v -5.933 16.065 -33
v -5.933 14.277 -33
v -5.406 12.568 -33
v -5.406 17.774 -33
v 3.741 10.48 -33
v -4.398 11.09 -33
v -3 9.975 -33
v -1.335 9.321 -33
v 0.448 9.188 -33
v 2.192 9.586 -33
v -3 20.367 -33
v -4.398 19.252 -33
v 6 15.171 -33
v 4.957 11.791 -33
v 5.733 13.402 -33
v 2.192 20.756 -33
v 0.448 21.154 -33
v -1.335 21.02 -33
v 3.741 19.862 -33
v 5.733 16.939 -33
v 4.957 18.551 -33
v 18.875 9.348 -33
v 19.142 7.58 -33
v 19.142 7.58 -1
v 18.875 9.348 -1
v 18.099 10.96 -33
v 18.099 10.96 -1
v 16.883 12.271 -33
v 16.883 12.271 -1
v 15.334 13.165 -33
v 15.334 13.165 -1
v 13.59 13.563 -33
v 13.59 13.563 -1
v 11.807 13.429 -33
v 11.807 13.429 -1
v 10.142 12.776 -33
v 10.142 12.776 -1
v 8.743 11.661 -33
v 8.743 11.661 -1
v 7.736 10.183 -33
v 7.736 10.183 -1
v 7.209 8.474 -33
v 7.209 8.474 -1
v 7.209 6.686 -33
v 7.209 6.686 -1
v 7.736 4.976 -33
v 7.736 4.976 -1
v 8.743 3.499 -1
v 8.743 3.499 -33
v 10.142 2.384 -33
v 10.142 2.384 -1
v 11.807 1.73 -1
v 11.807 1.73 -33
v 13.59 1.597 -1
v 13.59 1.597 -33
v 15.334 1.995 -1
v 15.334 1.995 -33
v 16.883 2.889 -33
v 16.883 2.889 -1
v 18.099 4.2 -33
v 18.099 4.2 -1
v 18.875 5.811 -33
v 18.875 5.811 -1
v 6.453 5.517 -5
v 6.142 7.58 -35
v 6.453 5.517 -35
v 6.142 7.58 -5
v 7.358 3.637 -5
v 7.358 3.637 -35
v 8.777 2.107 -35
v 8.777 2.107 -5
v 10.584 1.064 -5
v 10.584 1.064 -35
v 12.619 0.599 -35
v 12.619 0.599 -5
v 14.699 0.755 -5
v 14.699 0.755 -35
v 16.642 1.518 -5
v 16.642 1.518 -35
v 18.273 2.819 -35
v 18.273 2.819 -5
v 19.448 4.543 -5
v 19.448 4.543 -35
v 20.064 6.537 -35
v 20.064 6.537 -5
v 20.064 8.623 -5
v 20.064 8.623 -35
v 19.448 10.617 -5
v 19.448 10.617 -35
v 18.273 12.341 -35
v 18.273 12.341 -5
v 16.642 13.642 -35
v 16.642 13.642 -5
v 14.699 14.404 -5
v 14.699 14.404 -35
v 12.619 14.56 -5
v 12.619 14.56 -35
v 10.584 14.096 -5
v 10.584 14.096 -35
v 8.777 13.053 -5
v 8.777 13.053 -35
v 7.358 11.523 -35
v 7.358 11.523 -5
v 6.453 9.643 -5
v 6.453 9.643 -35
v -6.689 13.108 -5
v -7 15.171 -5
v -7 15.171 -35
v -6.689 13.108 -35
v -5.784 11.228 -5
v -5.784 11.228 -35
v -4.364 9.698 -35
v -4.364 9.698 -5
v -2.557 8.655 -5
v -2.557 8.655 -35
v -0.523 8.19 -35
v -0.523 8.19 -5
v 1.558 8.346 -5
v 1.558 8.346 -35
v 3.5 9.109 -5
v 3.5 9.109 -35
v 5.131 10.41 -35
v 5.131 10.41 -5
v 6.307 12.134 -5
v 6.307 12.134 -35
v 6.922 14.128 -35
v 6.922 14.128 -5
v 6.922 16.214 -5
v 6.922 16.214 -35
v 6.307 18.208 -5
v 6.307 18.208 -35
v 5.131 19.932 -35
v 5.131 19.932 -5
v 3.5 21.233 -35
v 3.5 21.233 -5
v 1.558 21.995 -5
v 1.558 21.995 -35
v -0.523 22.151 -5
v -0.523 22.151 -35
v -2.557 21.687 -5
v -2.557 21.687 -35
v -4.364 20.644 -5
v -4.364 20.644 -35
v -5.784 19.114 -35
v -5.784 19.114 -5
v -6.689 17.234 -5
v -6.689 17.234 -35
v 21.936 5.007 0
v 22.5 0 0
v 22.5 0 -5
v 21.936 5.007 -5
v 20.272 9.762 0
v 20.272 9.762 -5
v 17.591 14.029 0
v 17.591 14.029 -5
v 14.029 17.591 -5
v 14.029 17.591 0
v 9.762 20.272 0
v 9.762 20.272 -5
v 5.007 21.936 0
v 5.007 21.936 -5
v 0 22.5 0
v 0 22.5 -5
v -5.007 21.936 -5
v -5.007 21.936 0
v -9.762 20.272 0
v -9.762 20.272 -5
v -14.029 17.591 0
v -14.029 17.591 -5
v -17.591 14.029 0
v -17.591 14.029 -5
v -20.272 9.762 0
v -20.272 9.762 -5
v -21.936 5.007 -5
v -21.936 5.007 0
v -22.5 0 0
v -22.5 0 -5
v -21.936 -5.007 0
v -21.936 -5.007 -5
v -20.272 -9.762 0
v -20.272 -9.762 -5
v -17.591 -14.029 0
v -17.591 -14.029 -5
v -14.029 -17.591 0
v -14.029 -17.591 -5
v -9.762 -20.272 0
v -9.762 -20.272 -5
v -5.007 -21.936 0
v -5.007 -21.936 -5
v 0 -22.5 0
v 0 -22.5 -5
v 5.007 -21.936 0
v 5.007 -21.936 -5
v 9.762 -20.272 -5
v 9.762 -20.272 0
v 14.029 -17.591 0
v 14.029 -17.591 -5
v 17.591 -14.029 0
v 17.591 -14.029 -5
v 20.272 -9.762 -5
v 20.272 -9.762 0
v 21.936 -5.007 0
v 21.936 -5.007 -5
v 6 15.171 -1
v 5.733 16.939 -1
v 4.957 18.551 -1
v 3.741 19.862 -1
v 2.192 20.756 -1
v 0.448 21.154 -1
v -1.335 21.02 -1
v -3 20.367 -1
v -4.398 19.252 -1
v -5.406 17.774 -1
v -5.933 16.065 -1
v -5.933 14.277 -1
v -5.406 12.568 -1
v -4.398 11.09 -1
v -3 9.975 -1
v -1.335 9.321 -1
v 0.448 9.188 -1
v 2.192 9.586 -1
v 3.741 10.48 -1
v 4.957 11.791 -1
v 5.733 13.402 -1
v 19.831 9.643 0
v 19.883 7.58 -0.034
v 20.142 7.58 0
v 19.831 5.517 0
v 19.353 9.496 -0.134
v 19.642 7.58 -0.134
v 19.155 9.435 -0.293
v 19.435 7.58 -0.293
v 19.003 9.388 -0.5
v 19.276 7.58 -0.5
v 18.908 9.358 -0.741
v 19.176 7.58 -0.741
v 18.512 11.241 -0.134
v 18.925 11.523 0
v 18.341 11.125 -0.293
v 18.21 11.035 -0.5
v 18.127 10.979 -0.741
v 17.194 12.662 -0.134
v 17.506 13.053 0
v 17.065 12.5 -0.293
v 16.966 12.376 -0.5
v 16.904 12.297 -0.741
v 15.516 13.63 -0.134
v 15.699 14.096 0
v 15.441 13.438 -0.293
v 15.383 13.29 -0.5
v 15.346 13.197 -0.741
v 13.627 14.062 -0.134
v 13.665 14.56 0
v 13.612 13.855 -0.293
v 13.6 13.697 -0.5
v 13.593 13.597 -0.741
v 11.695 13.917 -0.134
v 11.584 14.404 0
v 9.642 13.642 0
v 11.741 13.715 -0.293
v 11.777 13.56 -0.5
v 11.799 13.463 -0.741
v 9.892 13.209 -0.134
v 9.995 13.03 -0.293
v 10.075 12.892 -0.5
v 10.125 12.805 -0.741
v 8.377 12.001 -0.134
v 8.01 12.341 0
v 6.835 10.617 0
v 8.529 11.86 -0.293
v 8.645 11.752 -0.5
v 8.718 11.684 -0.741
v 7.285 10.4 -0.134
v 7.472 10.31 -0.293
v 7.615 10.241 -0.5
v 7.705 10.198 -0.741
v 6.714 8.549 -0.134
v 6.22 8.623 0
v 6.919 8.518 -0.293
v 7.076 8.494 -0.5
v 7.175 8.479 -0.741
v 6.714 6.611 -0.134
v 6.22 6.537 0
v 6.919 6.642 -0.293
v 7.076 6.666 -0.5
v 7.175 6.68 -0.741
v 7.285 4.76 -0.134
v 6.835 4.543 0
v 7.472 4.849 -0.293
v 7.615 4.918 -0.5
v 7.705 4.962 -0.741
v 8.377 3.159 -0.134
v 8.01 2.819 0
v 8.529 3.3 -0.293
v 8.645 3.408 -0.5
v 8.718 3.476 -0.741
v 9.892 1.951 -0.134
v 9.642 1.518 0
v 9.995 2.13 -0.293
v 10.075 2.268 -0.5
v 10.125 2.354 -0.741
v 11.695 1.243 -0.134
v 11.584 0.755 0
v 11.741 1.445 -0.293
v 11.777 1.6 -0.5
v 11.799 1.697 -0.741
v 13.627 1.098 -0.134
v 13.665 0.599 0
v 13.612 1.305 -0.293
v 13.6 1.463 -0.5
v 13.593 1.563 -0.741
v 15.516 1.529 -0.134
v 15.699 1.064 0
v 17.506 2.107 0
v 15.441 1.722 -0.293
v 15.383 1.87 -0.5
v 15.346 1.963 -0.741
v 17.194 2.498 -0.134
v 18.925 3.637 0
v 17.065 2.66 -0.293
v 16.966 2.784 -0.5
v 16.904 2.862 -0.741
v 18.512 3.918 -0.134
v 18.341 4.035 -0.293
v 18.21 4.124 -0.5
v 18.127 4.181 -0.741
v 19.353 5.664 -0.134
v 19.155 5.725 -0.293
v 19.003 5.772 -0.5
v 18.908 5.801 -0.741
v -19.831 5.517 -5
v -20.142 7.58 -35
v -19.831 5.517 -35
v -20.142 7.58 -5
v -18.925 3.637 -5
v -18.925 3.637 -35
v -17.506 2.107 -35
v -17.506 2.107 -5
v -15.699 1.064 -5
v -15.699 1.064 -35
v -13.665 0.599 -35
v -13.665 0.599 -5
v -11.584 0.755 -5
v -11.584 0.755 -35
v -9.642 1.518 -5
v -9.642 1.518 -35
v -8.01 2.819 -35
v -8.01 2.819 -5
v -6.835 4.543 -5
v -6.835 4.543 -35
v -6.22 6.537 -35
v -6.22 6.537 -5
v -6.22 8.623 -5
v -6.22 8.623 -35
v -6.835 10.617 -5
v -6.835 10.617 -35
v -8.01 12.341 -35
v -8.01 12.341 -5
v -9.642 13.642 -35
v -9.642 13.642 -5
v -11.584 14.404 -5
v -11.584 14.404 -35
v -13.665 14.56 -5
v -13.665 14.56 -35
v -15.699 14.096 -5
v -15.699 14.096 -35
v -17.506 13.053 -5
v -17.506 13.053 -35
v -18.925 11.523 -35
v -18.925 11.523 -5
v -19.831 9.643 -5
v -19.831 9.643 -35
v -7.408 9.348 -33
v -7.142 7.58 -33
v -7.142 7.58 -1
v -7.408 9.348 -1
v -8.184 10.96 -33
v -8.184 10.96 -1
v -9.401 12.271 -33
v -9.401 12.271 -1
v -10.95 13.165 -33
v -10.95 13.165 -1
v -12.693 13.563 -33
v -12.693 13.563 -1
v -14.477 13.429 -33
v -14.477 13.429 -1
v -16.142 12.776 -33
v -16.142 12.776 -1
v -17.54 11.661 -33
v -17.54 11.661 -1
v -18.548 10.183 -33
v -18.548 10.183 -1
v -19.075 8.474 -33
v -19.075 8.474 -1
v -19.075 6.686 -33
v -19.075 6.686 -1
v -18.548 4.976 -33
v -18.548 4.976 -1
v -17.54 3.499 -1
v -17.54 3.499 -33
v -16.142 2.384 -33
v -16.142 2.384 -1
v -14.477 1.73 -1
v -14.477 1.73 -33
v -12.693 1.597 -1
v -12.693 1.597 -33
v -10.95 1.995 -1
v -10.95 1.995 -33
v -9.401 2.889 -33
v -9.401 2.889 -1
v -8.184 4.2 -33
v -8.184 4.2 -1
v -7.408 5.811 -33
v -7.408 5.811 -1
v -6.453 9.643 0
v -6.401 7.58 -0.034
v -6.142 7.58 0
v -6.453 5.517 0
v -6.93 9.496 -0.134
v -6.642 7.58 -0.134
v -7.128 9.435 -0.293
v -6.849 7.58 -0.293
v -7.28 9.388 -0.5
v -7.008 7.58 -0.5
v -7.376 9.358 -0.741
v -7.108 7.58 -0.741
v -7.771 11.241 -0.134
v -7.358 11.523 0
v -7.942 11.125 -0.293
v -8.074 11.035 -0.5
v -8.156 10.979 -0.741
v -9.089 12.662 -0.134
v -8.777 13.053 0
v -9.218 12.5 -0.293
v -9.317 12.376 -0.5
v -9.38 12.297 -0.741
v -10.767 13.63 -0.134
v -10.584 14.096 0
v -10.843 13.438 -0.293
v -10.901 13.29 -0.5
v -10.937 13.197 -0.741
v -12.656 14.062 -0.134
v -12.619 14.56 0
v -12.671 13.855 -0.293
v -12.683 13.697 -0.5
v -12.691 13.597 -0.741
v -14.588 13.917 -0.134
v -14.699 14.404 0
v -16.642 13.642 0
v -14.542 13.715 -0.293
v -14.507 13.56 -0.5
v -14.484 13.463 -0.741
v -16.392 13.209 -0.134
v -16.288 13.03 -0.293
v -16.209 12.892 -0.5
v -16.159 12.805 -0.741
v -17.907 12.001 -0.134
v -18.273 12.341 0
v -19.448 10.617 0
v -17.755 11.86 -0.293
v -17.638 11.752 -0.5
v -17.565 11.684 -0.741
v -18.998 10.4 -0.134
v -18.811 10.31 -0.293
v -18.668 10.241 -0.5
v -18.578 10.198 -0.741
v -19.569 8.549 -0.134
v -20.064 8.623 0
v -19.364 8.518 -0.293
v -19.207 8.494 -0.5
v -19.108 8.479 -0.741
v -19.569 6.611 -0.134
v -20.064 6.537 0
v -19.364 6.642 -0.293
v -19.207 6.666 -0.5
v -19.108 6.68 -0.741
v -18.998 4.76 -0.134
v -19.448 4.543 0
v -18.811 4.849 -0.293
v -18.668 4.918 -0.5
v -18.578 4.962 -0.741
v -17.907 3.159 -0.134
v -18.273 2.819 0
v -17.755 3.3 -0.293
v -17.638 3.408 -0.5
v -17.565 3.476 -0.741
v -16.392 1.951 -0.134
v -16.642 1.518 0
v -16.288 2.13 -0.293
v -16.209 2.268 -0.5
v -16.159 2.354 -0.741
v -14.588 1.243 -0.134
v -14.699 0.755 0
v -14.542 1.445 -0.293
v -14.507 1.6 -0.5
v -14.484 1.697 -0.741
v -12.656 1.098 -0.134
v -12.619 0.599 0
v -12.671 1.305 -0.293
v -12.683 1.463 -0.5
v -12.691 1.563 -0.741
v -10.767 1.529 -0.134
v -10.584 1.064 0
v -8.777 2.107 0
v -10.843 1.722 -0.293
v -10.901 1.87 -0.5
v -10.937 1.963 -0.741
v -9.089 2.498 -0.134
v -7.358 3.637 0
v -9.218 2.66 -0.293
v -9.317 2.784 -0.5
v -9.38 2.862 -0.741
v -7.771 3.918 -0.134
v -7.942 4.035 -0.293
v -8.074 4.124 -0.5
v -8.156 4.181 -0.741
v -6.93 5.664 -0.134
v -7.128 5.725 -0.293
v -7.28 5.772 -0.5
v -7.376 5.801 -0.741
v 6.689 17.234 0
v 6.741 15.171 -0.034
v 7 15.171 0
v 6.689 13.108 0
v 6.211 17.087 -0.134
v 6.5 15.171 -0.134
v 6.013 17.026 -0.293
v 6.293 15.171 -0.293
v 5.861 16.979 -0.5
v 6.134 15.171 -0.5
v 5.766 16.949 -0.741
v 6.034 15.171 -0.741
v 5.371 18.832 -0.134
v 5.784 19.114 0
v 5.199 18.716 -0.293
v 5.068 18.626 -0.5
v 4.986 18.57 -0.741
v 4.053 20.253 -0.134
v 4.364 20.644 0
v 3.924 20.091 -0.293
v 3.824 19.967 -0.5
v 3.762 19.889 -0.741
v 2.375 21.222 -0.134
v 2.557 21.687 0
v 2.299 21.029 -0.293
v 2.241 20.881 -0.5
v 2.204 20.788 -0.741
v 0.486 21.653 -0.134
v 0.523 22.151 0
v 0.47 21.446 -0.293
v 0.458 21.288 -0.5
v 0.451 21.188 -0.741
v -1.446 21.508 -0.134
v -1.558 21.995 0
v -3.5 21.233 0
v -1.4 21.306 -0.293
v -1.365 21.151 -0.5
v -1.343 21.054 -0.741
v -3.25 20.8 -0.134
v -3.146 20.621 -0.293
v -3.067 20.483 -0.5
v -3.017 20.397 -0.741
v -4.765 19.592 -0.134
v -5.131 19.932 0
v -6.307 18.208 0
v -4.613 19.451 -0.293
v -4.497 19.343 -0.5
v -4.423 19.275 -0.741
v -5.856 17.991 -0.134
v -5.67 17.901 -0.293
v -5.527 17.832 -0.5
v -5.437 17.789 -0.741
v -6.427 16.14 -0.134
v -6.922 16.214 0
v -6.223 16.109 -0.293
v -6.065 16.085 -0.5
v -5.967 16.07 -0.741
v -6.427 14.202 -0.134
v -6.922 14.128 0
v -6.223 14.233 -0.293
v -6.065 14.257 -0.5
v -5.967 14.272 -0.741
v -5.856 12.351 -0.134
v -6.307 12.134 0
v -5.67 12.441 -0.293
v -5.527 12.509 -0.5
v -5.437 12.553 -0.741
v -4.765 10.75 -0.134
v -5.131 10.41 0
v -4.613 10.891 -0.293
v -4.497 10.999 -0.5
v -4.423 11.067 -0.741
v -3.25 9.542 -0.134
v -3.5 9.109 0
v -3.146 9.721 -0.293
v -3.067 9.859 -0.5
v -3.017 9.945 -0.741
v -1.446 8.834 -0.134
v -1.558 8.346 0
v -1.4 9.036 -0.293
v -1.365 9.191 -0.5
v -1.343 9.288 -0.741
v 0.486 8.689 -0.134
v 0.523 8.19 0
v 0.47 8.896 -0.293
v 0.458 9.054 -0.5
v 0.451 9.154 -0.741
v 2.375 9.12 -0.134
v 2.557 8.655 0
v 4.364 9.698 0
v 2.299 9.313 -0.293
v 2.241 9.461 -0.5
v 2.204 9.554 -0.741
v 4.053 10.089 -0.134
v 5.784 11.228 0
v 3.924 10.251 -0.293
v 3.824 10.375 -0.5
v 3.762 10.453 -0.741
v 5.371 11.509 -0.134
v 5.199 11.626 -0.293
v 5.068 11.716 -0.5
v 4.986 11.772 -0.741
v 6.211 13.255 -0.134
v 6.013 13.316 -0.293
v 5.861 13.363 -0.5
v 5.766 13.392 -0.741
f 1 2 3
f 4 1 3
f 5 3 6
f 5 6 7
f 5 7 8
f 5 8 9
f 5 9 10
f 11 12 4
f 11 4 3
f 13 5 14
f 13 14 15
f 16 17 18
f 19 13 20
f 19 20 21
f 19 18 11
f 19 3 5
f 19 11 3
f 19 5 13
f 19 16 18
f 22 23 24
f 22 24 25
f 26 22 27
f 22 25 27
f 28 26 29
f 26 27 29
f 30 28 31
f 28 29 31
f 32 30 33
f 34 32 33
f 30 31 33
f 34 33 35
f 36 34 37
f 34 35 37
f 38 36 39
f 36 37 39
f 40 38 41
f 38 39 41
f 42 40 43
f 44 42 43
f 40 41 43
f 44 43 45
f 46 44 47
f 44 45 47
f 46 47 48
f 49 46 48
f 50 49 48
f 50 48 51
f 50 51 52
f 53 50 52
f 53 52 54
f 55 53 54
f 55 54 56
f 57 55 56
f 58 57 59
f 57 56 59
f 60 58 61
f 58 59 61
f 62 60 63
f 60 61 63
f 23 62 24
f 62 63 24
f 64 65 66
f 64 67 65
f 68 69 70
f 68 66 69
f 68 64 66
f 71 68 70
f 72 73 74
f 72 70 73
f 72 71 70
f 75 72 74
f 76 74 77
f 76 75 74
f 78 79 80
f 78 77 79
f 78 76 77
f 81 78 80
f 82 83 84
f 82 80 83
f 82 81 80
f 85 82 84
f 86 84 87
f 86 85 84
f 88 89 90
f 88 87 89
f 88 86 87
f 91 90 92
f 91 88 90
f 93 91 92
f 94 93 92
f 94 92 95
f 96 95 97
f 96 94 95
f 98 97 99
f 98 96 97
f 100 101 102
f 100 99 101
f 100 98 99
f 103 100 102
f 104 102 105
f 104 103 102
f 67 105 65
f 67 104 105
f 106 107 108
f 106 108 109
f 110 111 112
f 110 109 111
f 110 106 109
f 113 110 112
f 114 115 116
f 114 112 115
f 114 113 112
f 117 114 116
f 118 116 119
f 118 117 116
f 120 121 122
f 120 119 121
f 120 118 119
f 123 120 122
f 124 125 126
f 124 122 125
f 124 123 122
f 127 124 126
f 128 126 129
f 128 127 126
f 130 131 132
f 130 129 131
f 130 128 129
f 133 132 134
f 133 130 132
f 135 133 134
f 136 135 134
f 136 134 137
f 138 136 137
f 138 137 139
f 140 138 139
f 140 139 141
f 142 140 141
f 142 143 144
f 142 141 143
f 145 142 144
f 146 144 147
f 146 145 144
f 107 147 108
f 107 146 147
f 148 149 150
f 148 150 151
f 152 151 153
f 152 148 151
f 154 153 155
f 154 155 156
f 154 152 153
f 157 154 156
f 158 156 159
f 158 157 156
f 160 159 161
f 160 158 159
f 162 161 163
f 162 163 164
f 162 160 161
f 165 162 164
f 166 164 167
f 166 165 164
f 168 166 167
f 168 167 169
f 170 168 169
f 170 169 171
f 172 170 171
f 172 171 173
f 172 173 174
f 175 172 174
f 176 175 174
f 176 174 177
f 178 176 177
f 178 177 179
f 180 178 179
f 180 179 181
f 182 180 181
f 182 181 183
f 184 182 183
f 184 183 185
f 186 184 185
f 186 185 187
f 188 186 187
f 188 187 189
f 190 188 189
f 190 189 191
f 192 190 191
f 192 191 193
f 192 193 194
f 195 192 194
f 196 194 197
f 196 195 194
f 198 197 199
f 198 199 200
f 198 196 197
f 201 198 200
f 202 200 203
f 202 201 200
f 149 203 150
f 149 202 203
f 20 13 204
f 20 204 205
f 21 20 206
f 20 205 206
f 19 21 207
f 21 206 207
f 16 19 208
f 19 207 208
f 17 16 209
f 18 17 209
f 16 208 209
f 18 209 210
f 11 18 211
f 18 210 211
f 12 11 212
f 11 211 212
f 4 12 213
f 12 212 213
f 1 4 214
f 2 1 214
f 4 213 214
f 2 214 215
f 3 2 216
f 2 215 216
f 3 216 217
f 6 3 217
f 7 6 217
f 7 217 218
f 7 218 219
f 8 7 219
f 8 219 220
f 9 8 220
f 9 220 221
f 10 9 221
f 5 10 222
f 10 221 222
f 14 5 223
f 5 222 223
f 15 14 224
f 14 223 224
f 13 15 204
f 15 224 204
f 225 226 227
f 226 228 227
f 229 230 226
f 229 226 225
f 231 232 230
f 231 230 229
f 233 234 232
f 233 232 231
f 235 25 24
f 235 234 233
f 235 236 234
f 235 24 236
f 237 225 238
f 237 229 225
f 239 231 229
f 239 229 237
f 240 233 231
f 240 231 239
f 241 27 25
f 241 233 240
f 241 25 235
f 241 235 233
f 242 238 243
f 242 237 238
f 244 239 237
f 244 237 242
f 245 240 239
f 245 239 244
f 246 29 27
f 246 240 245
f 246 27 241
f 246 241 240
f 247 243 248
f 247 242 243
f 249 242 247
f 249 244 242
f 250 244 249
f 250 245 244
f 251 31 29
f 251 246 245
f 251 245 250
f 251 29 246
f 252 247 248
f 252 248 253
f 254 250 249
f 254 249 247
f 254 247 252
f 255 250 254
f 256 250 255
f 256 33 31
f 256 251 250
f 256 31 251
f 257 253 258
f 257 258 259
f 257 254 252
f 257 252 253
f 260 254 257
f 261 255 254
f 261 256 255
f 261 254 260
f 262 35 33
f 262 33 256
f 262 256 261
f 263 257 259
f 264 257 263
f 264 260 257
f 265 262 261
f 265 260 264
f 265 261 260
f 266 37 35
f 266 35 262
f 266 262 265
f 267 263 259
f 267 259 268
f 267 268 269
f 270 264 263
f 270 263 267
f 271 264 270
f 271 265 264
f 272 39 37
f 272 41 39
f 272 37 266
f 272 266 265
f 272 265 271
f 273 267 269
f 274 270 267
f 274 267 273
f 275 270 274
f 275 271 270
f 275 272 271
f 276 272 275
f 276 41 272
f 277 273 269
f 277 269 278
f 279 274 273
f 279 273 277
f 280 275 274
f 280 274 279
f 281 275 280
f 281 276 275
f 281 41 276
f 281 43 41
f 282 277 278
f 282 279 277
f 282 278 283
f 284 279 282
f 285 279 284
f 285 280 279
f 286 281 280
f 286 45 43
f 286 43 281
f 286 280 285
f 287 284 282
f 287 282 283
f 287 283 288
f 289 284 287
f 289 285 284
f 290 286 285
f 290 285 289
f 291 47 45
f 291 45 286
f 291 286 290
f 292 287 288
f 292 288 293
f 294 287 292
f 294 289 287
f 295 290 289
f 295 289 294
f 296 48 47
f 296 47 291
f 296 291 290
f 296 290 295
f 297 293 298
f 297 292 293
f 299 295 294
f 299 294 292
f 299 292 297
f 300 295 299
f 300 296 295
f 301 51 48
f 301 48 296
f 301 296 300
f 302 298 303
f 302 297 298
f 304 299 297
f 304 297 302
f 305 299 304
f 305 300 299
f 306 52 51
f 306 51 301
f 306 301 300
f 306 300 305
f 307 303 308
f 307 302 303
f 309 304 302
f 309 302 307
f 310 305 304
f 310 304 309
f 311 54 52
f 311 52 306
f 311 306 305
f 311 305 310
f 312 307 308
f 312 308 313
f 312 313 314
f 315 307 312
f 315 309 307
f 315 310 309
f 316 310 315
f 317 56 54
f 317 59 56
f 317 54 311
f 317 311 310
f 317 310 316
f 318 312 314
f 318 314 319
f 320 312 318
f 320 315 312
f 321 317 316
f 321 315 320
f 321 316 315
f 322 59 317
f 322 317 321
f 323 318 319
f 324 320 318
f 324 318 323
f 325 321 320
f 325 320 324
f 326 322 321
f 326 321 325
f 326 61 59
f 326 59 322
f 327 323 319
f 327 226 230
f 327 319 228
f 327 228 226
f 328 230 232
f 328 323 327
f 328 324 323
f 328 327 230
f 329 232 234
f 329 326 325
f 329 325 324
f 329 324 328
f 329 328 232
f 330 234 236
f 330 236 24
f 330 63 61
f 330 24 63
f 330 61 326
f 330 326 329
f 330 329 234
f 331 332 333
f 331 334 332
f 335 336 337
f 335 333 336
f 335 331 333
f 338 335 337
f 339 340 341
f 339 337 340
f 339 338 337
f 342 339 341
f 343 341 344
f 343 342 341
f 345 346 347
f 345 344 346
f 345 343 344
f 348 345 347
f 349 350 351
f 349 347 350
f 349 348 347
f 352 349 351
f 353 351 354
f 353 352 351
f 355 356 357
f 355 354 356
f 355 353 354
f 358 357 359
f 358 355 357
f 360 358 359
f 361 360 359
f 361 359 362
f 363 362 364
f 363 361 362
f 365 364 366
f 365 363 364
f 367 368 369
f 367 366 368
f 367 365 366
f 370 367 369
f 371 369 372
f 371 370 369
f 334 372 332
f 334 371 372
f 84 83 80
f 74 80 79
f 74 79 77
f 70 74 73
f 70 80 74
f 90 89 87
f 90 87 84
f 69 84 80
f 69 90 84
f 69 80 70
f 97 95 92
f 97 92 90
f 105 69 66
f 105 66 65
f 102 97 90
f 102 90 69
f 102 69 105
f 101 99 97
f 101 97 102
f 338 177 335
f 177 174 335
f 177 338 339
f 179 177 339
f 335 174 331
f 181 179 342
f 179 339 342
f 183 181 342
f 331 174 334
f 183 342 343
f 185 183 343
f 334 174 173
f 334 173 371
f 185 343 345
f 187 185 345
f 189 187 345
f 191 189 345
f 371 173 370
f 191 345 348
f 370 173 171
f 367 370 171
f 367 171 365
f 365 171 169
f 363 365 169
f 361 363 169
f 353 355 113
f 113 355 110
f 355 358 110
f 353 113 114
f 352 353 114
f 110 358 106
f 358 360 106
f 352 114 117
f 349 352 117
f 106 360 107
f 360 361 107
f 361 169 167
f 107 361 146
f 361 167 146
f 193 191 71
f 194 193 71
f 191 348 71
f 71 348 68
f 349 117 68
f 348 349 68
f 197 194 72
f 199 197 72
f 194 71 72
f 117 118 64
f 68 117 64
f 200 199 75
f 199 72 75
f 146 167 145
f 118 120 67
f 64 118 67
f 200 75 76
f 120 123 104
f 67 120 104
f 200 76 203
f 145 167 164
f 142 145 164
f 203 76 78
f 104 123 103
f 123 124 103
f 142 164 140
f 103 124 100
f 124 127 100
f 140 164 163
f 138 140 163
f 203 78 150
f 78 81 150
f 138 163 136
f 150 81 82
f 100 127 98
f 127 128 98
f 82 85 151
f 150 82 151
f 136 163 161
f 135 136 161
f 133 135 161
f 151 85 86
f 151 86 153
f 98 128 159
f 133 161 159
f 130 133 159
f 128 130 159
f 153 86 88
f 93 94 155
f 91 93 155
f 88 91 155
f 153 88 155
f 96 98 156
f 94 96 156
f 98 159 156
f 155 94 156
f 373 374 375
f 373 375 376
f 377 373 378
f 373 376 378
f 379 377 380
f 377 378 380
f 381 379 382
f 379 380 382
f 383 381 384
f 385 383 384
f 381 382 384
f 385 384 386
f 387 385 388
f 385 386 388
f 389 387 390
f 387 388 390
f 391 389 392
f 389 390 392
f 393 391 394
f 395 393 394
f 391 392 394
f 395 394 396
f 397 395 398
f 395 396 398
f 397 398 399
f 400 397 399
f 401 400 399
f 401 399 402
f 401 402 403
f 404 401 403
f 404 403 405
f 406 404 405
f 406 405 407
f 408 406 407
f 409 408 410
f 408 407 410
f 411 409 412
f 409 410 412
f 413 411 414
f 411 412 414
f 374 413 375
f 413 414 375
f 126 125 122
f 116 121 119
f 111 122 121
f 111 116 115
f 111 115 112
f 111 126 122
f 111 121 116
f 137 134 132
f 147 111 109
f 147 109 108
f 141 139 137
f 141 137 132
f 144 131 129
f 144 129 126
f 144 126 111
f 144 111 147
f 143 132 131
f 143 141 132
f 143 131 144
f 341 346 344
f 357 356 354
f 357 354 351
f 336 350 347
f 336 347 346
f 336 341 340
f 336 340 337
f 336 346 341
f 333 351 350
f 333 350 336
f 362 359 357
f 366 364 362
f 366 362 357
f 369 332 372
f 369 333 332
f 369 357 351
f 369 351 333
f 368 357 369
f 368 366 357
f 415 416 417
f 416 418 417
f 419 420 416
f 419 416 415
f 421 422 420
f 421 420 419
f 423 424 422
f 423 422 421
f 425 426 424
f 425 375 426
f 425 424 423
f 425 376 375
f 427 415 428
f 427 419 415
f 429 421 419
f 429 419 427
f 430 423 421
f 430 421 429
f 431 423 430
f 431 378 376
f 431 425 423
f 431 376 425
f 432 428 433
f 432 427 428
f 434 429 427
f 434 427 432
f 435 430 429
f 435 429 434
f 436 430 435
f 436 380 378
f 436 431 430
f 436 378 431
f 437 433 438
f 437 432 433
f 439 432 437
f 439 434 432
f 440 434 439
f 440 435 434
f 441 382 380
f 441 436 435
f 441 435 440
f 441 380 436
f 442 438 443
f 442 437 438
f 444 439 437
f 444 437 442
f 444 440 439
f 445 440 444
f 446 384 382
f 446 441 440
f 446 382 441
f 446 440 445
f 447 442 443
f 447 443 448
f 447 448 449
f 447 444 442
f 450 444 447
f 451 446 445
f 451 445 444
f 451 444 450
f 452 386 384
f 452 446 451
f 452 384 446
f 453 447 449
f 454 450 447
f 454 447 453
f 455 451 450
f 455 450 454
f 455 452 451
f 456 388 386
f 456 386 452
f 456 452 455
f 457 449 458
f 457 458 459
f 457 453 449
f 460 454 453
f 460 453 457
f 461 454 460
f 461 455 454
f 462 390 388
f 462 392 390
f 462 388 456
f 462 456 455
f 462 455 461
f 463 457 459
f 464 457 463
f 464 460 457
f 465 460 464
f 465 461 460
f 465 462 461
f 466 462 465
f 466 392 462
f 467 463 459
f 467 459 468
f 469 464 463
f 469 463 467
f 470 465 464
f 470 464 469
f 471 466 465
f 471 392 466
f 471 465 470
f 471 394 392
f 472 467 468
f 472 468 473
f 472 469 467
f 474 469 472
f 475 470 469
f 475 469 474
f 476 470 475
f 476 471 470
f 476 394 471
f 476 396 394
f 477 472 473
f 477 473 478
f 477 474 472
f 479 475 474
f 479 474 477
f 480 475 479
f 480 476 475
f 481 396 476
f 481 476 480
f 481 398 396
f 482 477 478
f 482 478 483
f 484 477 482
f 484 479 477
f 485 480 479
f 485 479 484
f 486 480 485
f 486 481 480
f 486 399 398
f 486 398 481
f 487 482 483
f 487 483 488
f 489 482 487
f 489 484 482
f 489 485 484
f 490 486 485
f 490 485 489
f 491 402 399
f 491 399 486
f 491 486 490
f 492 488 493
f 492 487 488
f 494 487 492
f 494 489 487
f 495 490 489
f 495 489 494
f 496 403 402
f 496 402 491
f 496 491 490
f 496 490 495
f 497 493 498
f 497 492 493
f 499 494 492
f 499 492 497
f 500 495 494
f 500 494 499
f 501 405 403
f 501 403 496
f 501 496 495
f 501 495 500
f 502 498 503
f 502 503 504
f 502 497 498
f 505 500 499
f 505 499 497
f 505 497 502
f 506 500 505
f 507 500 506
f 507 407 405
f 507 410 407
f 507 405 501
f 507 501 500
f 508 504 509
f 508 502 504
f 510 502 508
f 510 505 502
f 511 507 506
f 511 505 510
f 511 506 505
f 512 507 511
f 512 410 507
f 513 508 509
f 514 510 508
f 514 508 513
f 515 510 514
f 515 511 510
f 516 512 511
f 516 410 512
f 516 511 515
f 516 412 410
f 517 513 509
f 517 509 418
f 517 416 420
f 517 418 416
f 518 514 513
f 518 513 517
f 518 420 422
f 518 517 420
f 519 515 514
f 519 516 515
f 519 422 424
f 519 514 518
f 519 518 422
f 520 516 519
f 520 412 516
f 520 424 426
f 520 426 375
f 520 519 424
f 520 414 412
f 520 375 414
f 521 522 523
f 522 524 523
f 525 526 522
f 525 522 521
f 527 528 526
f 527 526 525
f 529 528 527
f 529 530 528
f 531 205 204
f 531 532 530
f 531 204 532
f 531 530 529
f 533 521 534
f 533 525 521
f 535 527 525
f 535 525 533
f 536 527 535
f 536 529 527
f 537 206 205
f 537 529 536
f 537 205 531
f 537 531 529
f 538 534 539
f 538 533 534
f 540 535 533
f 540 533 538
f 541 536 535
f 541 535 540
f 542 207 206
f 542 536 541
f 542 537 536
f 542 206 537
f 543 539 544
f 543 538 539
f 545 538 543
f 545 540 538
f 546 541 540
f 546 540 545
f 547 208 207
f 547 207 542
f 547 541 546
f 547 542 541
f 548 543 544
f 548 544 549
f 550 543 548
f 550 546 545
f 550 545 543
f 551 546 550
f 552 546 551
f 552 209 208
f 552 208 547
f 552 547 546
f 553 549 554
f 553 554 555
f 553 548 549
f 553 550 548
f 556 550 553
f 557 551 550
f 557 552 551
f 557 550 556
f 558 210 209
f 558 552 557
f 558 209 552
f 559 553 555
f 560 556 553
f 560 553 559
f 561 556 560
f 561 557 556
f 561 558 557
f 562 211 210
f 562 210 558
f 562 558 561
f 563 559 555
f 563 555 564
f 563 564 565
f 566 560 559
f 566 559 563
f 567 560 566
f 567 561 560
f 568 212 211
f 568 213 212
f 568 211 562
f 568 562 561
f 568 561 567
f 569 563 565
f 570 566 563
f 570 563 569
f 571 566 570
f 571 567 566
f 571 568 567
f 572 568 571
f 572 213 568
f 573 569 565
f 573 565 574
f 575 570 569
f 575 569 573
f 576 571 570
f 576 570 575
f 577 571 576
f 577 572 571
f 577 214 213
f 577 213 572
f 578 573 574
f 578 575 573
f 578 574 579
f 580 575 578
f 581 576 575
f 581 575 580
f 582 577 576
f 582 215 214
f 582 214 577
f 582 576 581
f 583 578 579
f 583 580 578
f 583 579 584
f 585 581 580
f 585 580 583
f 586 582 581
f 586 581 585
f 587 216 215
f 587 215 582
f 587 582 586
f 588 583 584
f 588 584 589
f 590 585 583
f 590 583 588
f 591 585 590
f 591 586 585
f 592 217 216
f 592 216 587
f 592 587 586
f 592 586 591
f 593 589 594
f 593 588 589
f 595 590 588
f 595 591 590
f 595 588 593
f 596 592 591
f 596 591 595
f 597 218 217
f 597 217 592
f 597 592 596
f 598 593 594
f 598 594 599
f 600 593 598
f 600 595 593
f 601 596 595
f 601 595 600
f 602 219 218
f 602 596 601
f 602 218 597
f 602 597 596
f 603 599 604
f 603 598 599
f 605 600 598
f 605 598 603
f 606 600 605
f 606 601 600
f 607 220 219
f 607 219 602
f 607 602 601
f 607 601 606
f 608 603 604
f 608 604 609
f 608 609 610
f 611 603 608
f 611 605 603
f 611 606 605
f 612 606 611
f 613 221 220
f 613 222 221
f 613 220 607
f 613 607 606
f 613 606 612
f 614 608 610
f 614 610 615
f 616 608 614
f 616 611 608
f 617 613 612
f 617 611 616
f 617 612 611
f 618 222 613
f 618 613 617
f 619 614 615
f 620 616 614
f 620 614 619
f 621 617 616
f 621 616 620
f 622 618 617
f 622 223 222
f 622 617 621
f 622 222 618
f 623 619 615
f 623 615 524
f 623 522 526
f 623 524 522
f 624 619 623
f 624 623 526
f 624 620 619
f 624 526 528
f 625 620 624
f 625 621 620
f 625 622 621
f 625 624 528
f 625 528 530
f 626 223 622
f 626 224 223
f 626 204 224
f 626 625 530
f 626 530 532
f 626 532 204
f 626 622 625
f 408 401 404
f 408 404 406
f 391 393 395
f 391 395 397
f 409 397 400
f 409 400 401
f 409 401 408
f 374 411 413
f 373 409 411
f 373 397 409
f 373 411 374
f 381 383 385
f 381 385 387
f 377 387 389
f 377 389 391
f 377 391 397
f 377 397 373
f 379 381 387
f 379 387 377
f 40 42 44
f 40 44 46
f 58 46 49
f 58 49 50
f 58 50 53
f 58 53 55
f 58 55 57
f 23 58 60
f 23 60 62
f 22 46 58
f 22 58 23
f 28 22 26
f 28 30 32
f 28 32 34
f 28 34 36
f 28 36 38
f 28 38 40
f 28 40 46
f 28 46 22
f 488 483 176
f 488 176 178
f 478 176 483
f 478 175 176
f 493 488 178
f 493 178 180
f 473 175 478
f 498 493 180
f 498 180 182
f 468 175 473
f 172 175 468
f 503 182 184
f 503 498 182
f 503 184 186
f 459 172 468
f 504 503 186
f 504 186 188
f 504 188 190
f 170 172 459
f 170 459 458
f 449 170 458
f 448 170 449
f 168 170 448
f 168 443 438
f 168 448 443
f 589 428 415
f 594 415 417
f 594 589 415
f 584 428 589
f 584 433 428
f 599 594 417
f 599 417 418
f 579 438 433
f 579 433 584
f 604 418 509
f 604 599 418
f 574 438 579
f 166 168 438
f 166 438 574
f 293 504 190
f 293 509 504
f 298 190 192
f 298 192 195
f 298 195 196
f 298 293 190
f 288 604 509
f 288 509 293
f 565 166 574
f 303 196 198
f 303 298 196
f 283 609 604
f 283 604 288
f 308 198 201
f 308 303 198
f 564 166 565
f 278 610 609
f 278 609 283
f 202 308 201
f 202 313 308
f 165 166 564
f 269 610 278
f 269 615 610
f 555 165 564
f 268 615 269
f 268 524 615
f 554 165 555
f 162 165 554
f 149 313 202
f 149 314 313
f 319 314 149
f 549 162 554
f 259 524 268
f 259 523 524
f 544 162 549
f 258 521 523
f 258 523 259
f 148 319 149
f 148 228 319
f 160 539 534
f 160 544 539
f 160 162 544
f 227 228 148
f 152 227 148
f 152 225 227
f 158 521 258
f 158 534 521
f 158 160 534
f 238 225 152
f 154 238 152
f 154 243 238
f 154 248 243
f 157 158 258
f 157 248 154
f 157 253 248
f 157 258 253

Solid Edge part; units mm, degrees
sketch "Sketch1" plane through (0, 0, 0) normal (0, 0, 1) x (1, 0, 0)
  circle A0 centre (0, 0) radius 22.5
extrude "Protrusion1" add sketch "Sketch1" against normal blind 5
sketch "Sketch2" plane through (0, 0, -5) normal (0, 0, -1) x (-1, 0, 0)
  circle A0 centre (-13.1417, 7.5798) radius 7
  circle A1 centre (0, 15.1709) radius 7
  circle A2 centre (13.1417, 7.5798) radius 7
  dimension "D1" = 14
  dimension "D2" = 14
extrude "ExtrudedProtrusion_2" add sketch "Sketch2" along normal blind 30
sketch "Sketch3" plane through (0, 0, 0) normal (0, 0, 1) x (1, 0, 0)
  circle A0 centre (13.1417, 7.5798) radius 6
  circle A1 centre (0, 15.1709) radius 6
  circle A2 centre (-13.1417, 7.5798) radius 6
  dimension "D1" = 12
  dimension "D2" = 45
  dimension "D3" = 12
  dimension "D4" = 15.1709
  dimension "D5" = 43.8583
extrude "ExtrudedCutout_2" cut sketch "Sketch3" against normal blind 33
fillet "Round_1" radius 1 3 edges at (-6, 15.1709, 0) (-19.1417, 7.5798, 0) (7.1417, 7.5798, 0)
